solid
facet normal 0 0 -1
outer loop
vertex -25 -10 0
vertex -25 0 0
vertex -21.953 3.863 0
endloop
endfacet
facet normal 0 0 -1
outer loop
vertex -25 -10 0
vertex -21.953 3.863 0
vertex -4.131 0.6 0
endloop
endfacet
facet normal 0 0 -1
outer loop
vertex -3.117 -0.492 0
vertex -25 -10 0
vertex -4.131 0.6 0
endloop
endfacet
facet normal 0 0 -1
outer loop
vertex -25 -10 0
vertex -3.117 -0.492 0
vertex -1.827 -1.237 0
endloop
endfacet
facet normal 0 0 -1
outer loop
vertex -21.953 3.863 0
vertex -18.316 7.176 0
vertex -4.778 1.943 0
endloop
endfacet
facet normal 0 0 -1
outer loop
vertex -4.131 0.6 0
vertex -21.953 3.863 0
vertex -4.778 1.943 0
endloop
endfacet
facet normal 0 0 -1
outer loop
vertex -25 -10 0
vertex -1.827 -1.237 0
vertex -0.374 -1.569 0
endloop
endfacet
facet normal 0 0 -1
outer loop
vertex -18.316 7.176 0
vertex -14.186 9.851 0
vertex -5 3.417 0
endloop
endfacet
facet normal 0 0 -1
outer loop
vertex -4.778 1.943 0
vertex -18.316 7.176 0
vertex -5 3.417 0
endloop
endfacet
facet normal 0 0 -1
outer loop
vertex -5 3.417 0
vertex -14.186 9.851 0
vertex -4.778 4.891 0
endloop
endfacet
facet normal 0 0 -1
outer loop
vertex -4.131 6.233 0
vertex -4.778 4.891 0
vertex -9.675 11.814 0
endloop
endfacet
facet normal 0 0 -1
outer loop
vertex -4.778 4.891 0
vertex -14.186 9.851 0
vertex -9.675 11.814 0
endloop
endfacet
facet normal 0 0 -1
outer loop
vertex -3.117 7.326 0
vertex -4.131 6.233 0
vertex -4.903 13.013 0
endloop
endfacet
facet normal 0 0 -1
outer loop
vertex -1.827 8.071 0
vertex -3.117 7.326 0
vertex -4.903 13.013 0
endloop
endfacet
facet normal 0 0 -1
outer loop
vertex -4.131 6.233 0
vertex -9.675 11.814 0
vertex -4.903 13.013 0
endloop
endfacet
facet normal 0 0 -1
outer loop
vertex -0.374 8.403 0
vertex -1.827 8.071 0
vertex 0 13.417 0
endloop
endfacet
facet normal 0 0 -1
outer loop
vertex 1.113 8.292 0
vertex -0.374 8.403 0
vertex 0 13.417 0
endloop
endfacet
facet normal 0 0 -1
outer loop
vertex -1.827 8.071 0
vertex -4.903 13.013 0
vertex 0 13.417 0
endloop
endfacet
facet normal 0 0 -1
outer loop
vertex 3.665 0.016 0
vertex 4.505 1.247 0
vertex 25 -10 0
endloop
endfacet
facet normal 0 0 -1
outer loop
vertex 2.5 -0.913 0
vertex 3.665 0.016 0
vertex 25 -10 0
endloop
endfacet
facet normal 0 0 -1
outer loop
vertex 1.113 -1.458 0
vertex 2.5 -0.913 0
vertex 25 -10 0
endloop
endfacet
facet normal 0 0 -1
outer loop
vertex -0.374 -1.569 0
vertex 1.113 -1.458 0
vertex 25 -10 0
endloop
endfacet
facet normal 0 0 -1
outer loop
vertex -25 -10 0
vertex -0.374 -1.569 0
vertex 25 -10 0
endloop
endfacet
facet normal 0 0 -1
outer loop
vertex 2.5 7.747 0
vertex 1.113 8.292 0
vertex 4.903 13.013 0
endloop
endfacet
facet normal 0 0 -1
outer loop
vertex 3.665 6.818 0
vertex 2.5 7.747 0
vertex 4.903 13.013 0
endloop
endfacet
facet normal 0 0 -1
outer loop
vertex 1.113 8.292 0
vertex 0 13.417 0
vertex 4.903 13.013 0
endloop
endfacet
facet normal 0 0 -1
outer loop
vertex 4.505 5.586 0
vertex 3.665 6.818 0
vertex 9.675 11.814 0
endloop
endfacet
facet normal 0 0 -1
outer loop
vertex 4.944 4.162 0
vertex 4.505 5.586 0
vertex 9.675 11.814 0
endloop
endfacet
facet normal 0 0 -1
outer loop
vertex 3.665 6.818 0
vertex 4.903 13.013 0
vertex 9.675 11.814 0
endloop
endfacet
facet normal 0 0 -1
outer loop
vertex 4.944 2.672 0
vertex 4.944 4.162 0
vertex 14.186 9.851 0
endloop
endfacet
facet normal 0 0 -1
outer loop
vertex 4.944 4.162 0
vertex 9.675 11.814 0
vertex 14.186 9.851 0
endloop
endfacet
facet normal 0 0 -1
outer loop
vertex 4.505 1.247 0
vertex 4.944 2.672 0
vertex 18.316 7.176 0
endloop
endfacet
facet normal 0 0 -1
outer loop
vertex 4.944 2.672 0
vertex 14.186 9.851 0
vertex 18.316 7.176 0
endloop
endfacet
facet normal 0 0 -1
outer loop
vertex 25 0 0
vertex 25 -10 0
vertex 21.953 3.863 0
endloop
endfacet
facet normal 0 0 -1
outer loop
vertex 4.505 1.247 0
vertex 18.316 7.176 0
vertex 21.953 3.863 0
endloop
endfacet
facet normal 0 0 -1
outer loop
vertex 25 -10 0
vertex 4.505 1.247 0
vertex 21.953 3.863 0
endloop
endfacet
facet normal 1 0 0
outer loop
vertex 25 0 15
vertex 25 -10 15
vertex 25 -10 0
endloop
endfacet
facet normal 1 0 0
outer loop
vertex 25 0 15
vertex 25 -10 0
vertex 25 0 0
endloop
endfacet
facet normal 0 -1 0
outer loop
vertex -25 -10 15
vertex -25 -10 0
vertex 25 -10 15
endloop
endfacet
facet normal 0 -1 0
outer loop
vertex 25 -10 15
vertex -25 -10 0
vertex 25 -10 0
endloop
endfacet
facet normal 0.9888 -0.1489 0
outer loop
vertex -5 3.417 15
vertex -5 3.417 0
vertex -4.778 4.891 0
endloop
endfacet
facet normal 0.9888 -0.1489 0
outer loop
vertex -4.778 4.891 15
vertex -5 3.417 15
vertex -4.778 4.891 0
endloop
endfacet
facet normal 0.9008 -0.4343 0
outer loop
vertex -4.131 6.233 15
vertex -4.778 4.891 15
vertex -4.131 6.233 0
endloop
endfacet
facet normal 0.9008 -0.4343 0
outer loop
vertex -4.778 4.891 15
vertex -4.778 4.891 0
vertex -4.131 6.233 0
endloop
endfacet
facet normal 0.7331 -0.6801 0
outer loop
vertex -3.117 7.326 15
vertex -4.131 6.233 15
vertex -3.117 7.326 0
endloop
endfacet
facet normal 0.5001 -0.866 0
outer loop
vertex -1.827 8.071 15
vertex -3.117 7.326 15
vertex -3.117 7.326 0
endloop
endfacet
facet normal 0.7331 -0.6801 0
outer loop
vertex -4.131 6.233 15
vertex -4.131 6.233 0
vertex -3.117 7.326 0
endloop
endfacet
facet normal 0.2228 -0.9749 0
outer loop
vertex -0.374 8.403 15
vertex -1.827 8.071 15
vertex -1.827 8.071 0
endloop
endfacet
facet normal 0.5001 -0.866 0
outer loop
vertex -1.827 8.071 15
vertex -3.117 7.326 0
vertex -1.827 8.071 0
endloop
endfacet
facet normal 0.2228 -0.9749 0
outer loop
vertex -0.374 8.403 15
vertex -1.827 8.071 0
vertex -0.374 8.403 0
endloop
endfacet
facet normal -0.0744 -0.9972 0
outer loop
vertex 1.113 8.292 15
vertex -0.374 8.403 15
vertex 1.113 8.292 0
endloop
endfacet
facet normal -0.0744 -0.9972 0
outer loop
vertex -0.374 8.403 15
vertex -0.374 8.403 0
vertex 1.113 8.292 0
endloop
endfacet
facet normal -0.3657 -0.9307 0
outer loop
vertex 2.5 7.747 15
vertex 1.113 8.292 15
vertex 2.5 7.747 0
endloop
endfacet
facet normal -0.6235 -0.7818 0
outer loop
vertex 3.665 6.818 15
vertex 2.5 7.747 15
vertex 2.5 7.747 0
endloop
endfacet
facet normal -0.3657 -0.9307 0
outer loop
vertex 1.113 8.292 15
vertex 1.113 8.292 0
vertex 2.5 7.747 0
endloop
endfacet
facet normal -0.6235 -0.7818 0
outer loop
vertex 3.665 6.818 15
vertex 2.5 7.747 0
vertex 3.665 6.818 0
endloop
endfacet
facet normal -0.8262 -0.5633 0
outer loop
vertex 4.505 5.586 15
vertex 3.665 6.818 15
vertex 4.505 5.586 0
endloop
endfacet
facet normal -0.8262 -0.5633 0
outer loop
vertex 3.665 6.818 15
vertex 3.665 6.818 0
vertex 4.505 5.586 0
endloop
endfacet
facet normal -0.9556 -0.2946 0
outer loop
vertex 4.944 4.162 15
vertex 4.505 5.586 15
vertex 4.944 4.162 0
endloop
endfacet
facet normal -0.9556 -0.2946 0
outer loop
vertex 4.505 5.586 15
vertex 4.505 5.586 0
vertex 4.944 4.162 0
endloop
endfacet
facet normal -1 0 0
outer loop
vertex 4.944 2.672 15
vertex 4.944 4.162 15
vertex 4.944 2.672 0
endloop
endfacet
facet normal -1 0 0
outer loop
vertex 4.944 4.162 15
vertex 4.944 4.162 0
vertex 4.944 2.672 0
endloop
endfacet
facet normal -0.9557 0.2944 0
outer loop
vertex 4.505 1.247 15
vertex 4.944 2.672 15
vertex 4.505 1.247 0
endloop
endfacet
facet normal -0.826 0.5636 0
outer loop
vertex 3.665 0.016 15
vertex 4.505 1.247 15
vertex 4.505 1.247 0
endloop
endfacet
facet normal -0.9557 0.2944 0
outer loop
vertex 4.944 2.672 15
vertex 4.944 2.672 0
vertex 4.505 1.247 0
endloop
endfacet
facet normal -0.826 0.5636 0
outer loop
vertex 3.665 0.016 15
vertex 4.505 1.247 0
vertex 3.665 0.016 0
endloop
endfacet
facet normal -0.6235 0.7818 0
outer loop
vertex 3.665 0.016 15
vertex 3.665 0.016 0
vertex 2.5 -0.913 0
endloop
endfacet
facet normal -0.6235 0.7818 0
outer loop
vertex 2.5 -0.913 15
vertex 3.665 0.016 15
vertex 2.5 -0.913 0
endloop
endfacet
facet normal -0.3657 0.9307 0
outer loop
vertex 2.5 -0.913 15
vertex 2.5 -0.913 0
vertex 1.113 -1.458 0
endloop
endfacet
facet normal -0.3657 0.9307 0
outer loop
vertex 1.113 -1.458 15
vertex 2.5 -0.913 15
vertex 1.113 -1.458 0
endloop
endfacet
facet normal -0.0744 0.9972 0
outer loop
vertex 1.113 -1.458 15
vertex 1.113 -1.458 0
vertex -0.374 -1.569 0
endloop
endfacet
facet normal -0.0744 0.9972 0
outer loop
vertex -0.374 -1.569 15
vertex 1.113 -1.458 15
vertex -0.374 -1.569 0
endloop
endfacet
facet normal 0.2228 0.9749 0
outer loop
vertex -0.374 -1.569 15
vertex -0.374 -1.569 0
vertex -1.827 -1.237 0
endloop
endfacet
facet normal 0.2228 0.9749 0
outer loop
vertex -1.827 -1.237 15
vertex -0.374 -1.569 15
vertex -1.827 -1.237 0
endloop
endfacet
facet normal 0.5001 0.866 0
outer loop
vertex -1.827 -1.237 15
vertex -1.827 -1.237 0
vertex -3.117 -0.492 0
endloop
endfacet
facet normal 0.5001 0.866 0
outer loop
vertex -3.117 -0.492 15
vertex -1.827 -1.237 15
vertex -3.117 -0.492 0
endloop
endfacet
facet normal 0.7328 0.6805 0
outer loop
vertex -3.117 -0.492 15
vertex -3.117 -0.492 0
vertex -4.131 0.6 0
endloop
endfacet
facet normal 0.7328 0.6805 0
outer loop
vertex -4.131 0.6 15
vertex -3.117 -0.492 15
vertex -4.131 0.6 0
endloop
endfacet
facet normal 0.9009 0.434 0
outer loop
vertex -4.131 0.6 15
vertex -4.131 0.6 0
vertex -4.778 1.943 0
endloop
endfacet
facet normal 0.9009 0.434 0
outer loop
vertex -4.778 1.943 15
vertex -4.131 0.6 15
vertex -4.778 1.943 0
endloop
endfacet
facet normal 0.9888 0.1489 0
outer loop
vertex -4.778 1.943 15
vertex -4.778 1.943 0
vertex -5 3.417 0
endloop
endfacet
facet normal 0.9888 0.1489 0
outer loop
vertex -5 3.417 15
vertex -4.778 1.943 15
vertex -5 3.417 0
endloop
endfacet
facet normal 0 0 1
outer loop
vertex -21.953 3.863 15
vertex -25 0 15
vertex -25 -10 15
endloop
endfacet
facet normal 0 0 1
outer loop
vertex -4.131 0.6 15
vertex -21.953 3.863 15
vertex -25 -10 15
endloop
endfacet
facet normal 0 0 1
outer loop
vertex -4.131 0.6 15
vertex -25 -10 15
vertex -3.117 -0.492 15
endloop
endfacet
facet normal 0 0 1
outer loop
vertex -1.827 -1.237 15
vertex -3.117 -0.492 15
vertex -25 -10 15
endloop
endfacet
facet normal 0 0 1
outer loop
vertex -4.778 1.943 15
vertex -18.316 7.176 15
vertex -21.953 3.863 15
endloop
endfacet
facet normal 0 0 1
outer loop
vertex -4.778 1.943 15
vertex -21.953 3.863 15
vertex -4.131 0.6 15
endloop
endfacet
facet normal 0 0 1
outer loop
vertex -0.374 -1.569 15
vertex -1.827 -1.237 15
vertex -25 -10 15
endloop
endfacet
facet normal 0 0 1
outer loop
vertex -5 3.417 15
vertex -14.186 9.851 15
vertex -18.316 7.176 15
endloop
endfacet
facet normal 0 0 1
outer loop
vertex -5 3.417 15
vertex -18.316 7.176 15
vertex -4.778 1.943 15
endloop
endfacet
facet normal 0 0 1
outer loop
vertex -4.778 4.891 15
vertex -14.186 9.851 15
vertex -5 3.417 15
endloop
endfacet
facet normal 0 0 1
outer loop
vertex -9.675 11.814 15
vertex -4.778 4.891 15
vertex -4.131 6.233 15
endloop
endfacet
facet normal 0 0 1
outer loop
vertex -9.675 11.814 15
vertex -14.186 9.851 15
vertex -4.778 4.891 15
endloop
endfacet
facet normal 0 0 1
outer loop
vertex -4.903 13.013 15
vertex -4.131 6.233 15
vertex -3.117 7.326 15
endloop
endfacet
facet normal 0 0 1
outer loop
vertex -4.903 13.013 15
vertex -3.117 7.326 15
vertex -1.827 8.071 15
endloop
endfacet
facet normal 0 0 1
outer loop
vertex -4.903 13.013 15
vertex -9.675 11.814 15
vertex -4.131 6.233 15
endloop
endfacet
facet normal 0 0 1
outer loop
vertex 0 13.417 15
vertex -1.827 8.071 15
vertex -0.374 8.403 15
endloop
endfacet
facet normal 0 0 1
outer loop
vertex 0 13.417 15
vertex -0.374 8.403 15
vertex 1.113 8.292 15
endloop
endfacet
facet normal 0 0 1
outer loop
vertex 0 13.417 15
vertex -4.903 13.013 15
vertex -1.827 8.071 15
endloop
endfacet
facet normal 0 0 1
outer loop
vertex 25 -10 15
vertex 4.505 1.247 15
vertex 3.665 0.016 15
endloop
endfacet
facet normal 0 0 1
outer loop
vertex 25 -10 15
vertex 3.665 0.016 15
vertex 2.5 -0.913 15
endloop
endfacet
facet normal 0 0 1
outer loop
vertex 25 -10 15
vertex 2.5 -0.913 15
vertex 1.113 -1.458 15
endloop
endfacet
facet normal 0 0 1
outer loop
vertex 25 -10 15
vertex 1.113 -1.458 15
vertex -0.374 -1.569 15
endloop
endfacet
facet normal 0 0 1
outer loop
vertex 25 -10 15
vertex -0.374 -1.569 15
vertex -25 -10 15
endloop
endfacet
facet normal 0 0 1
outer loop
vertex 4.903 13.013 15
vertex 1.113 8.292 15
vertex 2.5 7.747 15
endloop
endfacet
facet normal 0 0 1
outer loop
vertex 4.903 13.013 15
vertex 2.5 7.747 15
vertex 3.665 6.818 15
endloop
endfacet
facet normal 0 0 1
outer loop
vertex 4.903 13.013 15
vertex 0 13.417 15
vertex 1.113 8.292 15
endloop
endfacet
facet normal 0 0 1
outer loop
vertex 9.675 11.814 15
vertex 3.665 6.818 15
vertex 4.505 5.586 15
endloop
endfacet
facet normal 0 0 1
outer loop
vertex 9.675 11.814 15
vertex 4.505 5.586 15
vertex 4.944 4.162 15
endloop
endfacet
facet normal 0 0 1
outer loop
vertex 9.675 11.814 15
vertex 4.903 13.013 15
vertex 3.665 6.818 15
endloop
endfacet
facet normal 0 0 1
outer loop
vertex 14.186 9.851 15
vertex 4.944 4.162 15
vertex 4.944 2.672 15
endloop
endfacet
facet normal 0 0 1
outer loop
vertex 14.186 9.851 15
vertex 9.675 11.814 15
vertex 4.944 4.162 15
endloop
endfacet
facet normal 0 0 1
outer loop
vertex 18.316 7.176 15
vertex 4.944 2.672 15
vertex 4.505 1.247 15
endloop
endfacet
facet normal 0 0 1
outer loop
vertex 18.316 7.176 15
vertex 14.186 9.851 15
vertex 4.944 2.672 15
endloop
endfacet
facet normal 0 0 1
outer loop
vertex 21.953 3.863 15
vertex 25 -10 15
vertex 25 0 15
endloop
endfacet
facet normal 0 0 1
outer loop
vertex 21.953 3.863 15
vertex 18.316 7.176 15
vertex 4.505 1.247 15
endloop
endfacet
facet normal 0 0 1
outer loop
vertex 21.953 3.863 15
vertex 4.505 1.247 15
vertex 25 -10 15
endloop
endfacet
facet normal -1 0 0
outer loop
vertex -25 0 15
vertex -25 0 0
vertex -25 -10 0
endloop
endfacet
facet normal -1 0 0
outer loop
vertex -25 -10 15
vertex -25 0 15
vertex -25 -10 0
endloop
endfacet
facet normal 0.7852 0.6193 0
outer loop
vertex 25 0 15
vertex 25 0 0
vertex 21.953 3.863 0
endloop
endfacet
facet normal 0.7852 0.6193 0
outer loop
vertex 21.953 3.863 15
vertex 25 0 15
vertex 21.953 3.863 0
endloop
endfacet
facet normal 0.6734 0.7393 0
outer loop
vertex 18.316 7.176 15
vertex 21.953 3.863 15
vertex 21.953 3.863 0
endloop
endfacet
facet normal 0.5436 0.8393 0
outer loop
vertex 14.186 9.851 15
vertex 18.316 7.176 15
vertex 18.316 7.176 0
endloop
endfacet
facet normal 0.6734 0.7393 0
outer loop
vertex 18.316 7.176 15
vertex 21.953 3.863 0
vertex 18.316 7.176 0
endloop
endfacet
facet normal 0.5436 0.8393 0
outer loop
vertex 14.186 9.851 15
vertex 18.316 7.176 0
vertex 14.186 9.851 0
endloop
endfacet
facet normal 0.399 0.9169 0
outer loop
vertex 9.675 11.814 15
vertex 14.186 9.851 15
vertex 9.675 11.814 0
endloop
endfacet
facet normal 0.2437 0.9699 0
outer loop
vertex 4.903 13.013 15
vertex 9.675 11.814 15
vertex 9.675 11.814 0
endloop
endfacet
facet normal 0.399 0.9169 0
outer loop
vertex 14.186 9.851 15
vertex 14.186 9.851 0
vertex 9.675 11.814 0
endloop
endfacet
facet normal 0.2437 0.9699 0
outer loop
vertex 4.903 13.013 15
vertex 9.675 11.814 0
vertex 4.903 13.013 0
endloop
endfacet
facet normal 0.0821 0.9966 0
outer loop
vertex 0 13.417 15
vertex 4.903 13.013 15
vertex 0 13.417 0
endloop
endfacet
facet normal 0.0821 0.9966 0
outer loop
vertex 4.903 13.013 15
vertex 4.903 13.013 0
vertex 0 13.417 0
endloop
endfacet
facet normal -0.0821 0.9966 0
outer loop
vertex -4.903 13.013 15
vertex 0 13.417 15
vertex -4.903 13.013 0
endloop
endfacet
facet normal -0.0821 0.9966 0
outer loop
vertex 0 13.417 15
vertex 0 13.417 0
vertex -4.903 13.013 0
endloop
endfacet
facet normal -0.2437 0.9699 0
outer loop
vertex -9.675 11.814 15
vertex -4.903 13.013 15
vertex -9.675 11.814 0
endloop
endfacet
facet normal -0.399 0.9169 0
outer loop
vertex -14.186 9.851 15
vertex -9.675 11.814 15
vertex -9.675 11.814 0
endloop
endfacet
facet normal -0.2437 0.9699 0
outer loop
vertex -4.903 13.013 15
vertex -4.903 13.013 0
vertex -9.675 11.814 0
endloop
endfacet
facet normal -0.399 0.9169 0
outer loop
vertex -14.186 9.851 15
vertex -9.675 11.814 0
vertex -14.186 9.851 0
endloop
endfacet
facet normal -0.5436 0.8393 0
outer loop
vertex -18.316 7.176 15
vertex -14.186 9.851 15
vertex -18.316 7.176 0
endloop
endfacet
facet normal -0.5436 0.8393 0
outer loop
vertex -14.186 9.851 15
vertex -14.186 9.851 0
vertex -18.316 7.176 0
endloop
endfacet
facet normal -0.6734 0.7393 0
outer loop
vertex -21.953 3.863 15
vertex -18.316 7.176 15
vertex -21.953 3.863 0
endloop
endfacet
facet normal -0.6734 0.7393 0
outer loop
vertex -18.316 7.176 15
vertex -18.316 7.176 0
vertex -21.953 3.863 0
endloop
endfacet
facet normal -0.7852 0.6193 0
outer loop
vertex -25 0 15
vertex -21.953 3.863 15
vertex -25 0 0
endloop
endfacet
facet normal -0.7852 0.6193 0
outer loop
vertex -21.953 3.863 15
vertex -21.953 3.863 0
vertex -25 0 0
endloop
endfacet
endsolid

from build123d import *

# Parameters (mm, degrees)
BOSS_EXTRUDE1_DEPTH = 15
CUT_EXTRUDE1_REACH  = 34.094
SKETCH2_R           = 5


with BuildPart() as part:
    # Sketch1 → Boss-Extrude1 (new body)
    with BuildSketch(Plane.XY):
        with BuildLine():
            Line((-25, 0), (-25, -10))
            Line((-25, -10), (25, -10))
            Line((25, -10), (25, 0))
            ThreePointArc((25, 0), (0, 13.416876048), (-25, 0))
        make_face()
    extrude(amount=BOSS_EXTRUDE1_DEPTH)

    # Sketch2 → Cut-Extrude1 (cut, up to next)
    with BuildSketch(Plane(origin=(0, 0, 0), x_dir=(-1, 0, 0), z_dir=(0, 0, -1)), mode=Mode.PRIVATE) as cut_extrude1_sk1:
        with Locations((0, 3.416876048)):
            Circle(SKETCH2_R)
    cut_extrude1_tool1 = extrude(cut_extrude1_sk1.sketch, amount=-CUT_EXTRUDE1_REACH, mode=Mode.PRIVATE) & part.part
    add(cut_extrude1_tool1.solids().sort_by_distance((0, 3.416876, 0))[0], mode=Mode.SUBTRACT)


solid = part.part
